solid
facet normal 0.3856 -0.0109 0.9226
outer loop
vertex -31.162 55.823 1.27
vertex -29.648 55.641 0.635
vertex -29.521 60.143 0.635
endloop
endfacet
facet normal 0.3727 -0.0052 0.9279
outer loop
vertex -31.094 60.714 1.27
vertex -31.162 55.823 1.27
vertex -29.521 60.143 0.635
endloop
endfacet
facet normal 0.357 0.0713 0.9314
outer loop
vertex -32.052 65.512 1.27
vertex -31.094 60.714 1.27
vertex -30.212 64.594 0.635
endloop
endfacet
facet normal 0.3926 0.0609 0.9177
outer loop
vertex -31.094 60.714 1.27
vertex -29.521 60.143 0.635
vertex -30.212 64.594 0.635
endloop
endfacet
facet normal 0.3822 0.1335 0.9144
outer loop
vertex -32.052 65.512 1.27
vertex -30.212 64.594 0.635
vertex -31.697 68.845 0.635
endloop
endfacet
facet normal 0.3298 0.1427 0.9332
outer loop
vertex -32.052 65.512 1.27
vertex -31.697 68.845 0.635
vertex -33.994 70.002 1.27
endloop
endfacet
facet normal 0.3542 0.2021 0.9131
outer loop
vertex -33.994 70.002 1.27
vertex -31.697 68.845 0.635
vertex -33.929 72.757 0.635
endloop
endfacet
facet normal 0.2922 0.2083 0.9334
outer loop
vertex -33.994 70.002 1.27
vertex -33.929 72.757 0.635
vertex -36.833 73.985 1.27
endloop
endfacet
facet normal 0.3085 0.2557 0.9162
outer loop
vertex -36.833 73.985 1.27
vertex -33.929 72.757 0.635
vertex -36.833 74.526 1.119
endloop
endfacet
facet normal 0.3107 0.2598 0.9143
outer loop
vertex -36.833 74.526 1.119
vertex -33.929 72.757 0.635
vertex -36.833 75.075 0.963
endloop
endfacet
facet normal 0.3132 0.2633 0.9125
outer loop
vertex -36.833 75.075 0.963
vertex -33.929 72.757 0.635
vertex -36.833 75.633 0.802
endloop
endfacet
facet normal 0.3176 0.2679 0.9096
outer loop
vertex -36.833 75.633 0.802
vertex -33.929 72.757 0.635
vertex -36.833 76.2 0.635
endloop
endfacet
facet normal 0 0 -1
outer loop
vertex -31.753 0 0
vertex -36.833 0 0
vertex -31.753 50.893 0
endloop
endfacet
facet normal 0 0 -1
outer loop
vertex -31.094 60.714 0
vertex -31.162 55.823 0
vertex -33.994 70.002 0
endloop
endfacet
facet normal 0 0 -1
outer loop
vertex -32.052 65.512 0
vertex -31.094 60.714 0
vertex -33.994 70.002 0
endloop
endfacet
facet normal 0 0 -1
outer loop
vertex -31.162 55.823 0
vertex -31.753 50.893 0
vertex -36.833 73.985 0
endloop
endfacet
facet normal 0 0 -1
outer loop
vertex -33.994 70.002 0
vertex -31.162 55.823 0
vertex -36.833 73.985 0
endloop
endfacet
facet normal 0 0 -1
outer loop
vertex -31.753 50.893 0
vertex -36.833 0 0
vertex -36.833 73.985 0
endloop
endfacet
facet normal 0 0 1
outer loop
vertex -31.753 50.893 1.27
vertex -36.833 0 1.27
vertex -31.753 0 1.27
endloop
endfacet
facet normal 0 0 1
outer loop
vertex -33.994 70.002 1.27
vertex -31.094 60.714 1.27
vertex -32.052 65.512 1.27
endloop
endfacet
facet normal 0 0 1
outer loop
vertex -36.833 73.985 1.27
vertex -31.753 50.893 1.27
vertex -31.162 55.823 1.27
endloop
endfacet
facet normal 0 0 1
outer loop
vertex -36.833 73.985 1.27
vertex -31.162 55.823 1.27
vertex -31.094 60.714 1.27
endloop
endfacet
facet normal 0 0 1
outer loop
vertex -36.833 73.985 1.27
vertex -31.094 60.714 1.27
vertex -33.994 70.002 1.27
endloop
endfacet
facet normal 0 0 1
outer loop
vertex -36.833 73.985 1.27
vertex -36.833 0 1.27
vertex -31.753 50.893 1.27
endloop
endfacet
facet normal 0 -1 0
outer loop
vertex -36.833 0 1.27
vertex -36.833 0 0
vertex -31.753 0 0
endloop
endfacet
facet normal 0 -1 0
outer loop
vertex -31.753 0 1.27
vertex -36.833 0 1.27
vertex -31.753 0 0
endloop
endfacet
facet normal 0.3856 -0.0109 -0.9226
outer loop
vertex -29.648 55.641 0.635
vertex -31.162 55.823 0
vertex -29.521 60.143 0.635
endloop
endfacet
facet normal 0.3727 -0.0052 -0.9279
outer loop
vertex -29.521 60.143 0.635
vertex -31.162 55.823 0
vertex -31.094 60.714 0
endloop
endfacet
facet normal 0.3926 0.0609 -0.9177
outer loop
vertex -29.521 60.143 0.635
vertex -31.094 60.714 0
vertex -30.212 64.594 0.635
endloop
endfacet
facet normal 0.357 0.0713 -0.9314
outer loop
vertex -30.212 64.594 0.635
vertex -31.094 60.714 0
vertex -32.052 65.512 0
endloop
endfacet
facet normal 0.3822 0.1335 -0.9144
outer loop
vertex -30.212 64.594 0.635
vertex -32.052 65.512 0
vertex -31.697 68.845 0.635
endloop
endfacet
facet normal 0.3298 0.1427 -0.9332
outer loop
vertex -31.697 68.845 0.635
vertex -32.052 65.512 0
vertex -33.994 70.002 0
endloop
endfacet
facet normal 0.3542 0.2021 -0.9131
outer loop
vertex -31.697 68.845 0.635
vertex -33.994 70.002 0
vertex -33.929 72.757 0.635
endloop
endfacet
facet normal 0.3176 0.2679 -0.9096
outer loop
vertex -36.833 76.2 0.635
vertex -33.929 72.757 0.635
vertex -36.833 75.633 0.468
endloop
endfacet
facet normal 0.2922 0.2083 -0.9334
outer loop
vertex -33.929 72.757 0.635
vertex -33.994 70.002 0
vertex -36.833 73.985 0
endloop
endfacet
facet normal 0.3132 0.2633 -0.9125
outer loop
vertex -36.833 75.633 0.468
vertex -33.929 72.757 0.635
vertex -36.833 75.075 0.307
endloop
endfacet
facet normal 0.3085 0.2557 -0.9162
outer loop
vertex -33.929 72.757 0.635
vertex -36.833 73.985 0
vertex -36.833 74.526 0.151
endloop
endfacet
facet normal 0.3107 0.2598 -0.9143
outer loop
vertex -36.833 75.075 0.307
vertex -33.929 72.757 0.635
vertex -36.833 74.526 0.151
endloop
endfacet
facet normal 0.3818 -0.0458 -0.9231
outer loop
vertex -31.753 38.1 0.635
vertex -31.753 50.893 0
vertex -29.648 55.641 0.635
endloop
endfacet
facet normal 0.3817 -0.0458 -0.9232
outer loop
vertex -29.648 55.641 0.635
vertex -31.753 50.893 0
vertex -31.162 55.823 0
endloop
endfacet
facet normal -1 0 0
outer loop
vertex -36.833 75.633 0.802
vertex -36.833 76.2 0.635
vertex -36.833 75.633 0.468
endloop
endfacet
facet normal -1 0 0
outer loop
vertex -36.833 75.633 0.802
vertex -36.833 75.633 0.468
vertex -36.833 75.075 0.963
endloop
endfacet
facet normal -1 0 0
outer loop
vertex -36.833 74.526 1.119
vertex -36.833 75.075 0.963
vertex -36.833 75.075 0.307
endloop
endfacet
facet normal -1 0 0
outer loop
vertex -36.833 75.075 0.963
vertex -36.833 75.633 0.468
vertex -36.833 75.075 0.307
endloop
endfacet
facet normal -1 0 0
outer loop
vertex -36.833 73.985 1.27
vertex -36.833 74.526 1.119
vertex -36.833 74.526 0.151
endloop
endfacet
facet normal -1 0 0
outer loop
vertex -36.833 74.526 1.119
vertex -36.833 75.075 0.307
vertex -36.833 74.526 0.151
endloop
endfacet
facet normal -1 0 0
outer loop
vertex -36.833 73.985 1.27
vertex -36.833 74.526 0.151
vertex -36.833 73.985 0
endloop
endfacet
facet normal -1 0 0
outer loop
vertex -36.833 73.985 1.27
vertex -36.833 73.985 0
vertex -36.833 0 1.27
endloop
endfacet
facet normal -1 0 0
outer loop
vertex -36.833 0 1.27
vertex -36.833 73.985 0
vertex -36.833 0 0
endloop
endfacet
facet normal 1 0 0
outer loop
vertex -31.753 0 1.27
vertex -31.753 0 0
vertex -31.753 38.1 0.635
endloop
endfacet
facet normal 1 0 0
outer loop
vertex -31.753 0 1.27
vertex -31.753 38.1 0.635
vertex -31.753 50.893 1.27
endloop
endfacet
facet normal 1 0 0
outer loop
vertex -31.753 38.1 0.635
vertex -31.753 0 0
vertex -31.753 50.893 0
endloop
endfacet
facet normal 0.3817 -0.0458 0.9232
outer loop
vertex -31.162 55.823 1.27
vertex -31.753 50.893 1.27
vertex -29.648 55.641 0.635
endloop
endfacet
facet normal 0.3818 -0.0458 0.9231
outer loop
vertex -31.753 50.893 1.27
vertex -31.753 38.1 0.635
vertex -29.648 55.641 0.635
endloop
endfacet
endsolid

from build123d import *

# Parameters (mm, degrees)
F1_DEPTH = 1.27
F2_SIZE2 = 1.524
F2_SIZE  = 0.635
F3_SIZE2 = 0.63499
F3_SIZE  = 1.52399


# Not quite as in the source:
# - a fillet or chamfer is up to 0.001 mm smaller than in the source, because OpenCascade refuses the exact size


with BuildPart() as f1:
    # F0 (on Top) → F1 (new body)
    with BuildSketch(Plane.XY):
        with BuildLine():
            Line((-36.8330654015, 25.4), (-36.8330654015, 0))
            Line((-36.8330654015, 0), (-31.7530654015, 0))
            Line((-31.7530654015, 0), (-31.7530654015, 25.4))
            Line((-31.7530654015, 25.4), (-31.7530654015, 38.1))
            Line((-31.7530654015, 38.1), (-29.6483766288, 55.6414723396))
            ThreePointArc((-29.6483766288, 55.6414723396), (-30.8576350362, 66.7535648315), (-36.8330654015, 76.2))
            Line((-36.8330654015, 76.2), (-36.8330654015, 25.4))
        make_face()
    extrude(amount=F1_DEPTH)

    # F2
    f2_edges = [f1.edges().sort_by_distance(p)[0] for p in [
        (-30.857635, 66.753565, 0),
    ]]
    f2_side = f1.faces().sort_by_distance((-30.857635, 66.753565, 0.635))[0]
    chamfer(f2_edges, length=F2_SIZE, length2=F2_SIZE2, reference=f2_side)

    # F3 (size 1.524 and 0.635 in the source; OpenCascade refuses exactly that, so slightly less here)
    f3_edges = [f1.edges().sort_by_distance(p)[0] for p in [
        (-30.857635, 66.753565, 1.27),
    ]]
    f3_side = f1.faces().sort_by_distance((-33.993145, 38.475909, 1.27))[0]
    chamfer(f3_edges, length=F3_SIZE, length2=F3_SIZE2, reference=f3_side)


solid = f1.part
